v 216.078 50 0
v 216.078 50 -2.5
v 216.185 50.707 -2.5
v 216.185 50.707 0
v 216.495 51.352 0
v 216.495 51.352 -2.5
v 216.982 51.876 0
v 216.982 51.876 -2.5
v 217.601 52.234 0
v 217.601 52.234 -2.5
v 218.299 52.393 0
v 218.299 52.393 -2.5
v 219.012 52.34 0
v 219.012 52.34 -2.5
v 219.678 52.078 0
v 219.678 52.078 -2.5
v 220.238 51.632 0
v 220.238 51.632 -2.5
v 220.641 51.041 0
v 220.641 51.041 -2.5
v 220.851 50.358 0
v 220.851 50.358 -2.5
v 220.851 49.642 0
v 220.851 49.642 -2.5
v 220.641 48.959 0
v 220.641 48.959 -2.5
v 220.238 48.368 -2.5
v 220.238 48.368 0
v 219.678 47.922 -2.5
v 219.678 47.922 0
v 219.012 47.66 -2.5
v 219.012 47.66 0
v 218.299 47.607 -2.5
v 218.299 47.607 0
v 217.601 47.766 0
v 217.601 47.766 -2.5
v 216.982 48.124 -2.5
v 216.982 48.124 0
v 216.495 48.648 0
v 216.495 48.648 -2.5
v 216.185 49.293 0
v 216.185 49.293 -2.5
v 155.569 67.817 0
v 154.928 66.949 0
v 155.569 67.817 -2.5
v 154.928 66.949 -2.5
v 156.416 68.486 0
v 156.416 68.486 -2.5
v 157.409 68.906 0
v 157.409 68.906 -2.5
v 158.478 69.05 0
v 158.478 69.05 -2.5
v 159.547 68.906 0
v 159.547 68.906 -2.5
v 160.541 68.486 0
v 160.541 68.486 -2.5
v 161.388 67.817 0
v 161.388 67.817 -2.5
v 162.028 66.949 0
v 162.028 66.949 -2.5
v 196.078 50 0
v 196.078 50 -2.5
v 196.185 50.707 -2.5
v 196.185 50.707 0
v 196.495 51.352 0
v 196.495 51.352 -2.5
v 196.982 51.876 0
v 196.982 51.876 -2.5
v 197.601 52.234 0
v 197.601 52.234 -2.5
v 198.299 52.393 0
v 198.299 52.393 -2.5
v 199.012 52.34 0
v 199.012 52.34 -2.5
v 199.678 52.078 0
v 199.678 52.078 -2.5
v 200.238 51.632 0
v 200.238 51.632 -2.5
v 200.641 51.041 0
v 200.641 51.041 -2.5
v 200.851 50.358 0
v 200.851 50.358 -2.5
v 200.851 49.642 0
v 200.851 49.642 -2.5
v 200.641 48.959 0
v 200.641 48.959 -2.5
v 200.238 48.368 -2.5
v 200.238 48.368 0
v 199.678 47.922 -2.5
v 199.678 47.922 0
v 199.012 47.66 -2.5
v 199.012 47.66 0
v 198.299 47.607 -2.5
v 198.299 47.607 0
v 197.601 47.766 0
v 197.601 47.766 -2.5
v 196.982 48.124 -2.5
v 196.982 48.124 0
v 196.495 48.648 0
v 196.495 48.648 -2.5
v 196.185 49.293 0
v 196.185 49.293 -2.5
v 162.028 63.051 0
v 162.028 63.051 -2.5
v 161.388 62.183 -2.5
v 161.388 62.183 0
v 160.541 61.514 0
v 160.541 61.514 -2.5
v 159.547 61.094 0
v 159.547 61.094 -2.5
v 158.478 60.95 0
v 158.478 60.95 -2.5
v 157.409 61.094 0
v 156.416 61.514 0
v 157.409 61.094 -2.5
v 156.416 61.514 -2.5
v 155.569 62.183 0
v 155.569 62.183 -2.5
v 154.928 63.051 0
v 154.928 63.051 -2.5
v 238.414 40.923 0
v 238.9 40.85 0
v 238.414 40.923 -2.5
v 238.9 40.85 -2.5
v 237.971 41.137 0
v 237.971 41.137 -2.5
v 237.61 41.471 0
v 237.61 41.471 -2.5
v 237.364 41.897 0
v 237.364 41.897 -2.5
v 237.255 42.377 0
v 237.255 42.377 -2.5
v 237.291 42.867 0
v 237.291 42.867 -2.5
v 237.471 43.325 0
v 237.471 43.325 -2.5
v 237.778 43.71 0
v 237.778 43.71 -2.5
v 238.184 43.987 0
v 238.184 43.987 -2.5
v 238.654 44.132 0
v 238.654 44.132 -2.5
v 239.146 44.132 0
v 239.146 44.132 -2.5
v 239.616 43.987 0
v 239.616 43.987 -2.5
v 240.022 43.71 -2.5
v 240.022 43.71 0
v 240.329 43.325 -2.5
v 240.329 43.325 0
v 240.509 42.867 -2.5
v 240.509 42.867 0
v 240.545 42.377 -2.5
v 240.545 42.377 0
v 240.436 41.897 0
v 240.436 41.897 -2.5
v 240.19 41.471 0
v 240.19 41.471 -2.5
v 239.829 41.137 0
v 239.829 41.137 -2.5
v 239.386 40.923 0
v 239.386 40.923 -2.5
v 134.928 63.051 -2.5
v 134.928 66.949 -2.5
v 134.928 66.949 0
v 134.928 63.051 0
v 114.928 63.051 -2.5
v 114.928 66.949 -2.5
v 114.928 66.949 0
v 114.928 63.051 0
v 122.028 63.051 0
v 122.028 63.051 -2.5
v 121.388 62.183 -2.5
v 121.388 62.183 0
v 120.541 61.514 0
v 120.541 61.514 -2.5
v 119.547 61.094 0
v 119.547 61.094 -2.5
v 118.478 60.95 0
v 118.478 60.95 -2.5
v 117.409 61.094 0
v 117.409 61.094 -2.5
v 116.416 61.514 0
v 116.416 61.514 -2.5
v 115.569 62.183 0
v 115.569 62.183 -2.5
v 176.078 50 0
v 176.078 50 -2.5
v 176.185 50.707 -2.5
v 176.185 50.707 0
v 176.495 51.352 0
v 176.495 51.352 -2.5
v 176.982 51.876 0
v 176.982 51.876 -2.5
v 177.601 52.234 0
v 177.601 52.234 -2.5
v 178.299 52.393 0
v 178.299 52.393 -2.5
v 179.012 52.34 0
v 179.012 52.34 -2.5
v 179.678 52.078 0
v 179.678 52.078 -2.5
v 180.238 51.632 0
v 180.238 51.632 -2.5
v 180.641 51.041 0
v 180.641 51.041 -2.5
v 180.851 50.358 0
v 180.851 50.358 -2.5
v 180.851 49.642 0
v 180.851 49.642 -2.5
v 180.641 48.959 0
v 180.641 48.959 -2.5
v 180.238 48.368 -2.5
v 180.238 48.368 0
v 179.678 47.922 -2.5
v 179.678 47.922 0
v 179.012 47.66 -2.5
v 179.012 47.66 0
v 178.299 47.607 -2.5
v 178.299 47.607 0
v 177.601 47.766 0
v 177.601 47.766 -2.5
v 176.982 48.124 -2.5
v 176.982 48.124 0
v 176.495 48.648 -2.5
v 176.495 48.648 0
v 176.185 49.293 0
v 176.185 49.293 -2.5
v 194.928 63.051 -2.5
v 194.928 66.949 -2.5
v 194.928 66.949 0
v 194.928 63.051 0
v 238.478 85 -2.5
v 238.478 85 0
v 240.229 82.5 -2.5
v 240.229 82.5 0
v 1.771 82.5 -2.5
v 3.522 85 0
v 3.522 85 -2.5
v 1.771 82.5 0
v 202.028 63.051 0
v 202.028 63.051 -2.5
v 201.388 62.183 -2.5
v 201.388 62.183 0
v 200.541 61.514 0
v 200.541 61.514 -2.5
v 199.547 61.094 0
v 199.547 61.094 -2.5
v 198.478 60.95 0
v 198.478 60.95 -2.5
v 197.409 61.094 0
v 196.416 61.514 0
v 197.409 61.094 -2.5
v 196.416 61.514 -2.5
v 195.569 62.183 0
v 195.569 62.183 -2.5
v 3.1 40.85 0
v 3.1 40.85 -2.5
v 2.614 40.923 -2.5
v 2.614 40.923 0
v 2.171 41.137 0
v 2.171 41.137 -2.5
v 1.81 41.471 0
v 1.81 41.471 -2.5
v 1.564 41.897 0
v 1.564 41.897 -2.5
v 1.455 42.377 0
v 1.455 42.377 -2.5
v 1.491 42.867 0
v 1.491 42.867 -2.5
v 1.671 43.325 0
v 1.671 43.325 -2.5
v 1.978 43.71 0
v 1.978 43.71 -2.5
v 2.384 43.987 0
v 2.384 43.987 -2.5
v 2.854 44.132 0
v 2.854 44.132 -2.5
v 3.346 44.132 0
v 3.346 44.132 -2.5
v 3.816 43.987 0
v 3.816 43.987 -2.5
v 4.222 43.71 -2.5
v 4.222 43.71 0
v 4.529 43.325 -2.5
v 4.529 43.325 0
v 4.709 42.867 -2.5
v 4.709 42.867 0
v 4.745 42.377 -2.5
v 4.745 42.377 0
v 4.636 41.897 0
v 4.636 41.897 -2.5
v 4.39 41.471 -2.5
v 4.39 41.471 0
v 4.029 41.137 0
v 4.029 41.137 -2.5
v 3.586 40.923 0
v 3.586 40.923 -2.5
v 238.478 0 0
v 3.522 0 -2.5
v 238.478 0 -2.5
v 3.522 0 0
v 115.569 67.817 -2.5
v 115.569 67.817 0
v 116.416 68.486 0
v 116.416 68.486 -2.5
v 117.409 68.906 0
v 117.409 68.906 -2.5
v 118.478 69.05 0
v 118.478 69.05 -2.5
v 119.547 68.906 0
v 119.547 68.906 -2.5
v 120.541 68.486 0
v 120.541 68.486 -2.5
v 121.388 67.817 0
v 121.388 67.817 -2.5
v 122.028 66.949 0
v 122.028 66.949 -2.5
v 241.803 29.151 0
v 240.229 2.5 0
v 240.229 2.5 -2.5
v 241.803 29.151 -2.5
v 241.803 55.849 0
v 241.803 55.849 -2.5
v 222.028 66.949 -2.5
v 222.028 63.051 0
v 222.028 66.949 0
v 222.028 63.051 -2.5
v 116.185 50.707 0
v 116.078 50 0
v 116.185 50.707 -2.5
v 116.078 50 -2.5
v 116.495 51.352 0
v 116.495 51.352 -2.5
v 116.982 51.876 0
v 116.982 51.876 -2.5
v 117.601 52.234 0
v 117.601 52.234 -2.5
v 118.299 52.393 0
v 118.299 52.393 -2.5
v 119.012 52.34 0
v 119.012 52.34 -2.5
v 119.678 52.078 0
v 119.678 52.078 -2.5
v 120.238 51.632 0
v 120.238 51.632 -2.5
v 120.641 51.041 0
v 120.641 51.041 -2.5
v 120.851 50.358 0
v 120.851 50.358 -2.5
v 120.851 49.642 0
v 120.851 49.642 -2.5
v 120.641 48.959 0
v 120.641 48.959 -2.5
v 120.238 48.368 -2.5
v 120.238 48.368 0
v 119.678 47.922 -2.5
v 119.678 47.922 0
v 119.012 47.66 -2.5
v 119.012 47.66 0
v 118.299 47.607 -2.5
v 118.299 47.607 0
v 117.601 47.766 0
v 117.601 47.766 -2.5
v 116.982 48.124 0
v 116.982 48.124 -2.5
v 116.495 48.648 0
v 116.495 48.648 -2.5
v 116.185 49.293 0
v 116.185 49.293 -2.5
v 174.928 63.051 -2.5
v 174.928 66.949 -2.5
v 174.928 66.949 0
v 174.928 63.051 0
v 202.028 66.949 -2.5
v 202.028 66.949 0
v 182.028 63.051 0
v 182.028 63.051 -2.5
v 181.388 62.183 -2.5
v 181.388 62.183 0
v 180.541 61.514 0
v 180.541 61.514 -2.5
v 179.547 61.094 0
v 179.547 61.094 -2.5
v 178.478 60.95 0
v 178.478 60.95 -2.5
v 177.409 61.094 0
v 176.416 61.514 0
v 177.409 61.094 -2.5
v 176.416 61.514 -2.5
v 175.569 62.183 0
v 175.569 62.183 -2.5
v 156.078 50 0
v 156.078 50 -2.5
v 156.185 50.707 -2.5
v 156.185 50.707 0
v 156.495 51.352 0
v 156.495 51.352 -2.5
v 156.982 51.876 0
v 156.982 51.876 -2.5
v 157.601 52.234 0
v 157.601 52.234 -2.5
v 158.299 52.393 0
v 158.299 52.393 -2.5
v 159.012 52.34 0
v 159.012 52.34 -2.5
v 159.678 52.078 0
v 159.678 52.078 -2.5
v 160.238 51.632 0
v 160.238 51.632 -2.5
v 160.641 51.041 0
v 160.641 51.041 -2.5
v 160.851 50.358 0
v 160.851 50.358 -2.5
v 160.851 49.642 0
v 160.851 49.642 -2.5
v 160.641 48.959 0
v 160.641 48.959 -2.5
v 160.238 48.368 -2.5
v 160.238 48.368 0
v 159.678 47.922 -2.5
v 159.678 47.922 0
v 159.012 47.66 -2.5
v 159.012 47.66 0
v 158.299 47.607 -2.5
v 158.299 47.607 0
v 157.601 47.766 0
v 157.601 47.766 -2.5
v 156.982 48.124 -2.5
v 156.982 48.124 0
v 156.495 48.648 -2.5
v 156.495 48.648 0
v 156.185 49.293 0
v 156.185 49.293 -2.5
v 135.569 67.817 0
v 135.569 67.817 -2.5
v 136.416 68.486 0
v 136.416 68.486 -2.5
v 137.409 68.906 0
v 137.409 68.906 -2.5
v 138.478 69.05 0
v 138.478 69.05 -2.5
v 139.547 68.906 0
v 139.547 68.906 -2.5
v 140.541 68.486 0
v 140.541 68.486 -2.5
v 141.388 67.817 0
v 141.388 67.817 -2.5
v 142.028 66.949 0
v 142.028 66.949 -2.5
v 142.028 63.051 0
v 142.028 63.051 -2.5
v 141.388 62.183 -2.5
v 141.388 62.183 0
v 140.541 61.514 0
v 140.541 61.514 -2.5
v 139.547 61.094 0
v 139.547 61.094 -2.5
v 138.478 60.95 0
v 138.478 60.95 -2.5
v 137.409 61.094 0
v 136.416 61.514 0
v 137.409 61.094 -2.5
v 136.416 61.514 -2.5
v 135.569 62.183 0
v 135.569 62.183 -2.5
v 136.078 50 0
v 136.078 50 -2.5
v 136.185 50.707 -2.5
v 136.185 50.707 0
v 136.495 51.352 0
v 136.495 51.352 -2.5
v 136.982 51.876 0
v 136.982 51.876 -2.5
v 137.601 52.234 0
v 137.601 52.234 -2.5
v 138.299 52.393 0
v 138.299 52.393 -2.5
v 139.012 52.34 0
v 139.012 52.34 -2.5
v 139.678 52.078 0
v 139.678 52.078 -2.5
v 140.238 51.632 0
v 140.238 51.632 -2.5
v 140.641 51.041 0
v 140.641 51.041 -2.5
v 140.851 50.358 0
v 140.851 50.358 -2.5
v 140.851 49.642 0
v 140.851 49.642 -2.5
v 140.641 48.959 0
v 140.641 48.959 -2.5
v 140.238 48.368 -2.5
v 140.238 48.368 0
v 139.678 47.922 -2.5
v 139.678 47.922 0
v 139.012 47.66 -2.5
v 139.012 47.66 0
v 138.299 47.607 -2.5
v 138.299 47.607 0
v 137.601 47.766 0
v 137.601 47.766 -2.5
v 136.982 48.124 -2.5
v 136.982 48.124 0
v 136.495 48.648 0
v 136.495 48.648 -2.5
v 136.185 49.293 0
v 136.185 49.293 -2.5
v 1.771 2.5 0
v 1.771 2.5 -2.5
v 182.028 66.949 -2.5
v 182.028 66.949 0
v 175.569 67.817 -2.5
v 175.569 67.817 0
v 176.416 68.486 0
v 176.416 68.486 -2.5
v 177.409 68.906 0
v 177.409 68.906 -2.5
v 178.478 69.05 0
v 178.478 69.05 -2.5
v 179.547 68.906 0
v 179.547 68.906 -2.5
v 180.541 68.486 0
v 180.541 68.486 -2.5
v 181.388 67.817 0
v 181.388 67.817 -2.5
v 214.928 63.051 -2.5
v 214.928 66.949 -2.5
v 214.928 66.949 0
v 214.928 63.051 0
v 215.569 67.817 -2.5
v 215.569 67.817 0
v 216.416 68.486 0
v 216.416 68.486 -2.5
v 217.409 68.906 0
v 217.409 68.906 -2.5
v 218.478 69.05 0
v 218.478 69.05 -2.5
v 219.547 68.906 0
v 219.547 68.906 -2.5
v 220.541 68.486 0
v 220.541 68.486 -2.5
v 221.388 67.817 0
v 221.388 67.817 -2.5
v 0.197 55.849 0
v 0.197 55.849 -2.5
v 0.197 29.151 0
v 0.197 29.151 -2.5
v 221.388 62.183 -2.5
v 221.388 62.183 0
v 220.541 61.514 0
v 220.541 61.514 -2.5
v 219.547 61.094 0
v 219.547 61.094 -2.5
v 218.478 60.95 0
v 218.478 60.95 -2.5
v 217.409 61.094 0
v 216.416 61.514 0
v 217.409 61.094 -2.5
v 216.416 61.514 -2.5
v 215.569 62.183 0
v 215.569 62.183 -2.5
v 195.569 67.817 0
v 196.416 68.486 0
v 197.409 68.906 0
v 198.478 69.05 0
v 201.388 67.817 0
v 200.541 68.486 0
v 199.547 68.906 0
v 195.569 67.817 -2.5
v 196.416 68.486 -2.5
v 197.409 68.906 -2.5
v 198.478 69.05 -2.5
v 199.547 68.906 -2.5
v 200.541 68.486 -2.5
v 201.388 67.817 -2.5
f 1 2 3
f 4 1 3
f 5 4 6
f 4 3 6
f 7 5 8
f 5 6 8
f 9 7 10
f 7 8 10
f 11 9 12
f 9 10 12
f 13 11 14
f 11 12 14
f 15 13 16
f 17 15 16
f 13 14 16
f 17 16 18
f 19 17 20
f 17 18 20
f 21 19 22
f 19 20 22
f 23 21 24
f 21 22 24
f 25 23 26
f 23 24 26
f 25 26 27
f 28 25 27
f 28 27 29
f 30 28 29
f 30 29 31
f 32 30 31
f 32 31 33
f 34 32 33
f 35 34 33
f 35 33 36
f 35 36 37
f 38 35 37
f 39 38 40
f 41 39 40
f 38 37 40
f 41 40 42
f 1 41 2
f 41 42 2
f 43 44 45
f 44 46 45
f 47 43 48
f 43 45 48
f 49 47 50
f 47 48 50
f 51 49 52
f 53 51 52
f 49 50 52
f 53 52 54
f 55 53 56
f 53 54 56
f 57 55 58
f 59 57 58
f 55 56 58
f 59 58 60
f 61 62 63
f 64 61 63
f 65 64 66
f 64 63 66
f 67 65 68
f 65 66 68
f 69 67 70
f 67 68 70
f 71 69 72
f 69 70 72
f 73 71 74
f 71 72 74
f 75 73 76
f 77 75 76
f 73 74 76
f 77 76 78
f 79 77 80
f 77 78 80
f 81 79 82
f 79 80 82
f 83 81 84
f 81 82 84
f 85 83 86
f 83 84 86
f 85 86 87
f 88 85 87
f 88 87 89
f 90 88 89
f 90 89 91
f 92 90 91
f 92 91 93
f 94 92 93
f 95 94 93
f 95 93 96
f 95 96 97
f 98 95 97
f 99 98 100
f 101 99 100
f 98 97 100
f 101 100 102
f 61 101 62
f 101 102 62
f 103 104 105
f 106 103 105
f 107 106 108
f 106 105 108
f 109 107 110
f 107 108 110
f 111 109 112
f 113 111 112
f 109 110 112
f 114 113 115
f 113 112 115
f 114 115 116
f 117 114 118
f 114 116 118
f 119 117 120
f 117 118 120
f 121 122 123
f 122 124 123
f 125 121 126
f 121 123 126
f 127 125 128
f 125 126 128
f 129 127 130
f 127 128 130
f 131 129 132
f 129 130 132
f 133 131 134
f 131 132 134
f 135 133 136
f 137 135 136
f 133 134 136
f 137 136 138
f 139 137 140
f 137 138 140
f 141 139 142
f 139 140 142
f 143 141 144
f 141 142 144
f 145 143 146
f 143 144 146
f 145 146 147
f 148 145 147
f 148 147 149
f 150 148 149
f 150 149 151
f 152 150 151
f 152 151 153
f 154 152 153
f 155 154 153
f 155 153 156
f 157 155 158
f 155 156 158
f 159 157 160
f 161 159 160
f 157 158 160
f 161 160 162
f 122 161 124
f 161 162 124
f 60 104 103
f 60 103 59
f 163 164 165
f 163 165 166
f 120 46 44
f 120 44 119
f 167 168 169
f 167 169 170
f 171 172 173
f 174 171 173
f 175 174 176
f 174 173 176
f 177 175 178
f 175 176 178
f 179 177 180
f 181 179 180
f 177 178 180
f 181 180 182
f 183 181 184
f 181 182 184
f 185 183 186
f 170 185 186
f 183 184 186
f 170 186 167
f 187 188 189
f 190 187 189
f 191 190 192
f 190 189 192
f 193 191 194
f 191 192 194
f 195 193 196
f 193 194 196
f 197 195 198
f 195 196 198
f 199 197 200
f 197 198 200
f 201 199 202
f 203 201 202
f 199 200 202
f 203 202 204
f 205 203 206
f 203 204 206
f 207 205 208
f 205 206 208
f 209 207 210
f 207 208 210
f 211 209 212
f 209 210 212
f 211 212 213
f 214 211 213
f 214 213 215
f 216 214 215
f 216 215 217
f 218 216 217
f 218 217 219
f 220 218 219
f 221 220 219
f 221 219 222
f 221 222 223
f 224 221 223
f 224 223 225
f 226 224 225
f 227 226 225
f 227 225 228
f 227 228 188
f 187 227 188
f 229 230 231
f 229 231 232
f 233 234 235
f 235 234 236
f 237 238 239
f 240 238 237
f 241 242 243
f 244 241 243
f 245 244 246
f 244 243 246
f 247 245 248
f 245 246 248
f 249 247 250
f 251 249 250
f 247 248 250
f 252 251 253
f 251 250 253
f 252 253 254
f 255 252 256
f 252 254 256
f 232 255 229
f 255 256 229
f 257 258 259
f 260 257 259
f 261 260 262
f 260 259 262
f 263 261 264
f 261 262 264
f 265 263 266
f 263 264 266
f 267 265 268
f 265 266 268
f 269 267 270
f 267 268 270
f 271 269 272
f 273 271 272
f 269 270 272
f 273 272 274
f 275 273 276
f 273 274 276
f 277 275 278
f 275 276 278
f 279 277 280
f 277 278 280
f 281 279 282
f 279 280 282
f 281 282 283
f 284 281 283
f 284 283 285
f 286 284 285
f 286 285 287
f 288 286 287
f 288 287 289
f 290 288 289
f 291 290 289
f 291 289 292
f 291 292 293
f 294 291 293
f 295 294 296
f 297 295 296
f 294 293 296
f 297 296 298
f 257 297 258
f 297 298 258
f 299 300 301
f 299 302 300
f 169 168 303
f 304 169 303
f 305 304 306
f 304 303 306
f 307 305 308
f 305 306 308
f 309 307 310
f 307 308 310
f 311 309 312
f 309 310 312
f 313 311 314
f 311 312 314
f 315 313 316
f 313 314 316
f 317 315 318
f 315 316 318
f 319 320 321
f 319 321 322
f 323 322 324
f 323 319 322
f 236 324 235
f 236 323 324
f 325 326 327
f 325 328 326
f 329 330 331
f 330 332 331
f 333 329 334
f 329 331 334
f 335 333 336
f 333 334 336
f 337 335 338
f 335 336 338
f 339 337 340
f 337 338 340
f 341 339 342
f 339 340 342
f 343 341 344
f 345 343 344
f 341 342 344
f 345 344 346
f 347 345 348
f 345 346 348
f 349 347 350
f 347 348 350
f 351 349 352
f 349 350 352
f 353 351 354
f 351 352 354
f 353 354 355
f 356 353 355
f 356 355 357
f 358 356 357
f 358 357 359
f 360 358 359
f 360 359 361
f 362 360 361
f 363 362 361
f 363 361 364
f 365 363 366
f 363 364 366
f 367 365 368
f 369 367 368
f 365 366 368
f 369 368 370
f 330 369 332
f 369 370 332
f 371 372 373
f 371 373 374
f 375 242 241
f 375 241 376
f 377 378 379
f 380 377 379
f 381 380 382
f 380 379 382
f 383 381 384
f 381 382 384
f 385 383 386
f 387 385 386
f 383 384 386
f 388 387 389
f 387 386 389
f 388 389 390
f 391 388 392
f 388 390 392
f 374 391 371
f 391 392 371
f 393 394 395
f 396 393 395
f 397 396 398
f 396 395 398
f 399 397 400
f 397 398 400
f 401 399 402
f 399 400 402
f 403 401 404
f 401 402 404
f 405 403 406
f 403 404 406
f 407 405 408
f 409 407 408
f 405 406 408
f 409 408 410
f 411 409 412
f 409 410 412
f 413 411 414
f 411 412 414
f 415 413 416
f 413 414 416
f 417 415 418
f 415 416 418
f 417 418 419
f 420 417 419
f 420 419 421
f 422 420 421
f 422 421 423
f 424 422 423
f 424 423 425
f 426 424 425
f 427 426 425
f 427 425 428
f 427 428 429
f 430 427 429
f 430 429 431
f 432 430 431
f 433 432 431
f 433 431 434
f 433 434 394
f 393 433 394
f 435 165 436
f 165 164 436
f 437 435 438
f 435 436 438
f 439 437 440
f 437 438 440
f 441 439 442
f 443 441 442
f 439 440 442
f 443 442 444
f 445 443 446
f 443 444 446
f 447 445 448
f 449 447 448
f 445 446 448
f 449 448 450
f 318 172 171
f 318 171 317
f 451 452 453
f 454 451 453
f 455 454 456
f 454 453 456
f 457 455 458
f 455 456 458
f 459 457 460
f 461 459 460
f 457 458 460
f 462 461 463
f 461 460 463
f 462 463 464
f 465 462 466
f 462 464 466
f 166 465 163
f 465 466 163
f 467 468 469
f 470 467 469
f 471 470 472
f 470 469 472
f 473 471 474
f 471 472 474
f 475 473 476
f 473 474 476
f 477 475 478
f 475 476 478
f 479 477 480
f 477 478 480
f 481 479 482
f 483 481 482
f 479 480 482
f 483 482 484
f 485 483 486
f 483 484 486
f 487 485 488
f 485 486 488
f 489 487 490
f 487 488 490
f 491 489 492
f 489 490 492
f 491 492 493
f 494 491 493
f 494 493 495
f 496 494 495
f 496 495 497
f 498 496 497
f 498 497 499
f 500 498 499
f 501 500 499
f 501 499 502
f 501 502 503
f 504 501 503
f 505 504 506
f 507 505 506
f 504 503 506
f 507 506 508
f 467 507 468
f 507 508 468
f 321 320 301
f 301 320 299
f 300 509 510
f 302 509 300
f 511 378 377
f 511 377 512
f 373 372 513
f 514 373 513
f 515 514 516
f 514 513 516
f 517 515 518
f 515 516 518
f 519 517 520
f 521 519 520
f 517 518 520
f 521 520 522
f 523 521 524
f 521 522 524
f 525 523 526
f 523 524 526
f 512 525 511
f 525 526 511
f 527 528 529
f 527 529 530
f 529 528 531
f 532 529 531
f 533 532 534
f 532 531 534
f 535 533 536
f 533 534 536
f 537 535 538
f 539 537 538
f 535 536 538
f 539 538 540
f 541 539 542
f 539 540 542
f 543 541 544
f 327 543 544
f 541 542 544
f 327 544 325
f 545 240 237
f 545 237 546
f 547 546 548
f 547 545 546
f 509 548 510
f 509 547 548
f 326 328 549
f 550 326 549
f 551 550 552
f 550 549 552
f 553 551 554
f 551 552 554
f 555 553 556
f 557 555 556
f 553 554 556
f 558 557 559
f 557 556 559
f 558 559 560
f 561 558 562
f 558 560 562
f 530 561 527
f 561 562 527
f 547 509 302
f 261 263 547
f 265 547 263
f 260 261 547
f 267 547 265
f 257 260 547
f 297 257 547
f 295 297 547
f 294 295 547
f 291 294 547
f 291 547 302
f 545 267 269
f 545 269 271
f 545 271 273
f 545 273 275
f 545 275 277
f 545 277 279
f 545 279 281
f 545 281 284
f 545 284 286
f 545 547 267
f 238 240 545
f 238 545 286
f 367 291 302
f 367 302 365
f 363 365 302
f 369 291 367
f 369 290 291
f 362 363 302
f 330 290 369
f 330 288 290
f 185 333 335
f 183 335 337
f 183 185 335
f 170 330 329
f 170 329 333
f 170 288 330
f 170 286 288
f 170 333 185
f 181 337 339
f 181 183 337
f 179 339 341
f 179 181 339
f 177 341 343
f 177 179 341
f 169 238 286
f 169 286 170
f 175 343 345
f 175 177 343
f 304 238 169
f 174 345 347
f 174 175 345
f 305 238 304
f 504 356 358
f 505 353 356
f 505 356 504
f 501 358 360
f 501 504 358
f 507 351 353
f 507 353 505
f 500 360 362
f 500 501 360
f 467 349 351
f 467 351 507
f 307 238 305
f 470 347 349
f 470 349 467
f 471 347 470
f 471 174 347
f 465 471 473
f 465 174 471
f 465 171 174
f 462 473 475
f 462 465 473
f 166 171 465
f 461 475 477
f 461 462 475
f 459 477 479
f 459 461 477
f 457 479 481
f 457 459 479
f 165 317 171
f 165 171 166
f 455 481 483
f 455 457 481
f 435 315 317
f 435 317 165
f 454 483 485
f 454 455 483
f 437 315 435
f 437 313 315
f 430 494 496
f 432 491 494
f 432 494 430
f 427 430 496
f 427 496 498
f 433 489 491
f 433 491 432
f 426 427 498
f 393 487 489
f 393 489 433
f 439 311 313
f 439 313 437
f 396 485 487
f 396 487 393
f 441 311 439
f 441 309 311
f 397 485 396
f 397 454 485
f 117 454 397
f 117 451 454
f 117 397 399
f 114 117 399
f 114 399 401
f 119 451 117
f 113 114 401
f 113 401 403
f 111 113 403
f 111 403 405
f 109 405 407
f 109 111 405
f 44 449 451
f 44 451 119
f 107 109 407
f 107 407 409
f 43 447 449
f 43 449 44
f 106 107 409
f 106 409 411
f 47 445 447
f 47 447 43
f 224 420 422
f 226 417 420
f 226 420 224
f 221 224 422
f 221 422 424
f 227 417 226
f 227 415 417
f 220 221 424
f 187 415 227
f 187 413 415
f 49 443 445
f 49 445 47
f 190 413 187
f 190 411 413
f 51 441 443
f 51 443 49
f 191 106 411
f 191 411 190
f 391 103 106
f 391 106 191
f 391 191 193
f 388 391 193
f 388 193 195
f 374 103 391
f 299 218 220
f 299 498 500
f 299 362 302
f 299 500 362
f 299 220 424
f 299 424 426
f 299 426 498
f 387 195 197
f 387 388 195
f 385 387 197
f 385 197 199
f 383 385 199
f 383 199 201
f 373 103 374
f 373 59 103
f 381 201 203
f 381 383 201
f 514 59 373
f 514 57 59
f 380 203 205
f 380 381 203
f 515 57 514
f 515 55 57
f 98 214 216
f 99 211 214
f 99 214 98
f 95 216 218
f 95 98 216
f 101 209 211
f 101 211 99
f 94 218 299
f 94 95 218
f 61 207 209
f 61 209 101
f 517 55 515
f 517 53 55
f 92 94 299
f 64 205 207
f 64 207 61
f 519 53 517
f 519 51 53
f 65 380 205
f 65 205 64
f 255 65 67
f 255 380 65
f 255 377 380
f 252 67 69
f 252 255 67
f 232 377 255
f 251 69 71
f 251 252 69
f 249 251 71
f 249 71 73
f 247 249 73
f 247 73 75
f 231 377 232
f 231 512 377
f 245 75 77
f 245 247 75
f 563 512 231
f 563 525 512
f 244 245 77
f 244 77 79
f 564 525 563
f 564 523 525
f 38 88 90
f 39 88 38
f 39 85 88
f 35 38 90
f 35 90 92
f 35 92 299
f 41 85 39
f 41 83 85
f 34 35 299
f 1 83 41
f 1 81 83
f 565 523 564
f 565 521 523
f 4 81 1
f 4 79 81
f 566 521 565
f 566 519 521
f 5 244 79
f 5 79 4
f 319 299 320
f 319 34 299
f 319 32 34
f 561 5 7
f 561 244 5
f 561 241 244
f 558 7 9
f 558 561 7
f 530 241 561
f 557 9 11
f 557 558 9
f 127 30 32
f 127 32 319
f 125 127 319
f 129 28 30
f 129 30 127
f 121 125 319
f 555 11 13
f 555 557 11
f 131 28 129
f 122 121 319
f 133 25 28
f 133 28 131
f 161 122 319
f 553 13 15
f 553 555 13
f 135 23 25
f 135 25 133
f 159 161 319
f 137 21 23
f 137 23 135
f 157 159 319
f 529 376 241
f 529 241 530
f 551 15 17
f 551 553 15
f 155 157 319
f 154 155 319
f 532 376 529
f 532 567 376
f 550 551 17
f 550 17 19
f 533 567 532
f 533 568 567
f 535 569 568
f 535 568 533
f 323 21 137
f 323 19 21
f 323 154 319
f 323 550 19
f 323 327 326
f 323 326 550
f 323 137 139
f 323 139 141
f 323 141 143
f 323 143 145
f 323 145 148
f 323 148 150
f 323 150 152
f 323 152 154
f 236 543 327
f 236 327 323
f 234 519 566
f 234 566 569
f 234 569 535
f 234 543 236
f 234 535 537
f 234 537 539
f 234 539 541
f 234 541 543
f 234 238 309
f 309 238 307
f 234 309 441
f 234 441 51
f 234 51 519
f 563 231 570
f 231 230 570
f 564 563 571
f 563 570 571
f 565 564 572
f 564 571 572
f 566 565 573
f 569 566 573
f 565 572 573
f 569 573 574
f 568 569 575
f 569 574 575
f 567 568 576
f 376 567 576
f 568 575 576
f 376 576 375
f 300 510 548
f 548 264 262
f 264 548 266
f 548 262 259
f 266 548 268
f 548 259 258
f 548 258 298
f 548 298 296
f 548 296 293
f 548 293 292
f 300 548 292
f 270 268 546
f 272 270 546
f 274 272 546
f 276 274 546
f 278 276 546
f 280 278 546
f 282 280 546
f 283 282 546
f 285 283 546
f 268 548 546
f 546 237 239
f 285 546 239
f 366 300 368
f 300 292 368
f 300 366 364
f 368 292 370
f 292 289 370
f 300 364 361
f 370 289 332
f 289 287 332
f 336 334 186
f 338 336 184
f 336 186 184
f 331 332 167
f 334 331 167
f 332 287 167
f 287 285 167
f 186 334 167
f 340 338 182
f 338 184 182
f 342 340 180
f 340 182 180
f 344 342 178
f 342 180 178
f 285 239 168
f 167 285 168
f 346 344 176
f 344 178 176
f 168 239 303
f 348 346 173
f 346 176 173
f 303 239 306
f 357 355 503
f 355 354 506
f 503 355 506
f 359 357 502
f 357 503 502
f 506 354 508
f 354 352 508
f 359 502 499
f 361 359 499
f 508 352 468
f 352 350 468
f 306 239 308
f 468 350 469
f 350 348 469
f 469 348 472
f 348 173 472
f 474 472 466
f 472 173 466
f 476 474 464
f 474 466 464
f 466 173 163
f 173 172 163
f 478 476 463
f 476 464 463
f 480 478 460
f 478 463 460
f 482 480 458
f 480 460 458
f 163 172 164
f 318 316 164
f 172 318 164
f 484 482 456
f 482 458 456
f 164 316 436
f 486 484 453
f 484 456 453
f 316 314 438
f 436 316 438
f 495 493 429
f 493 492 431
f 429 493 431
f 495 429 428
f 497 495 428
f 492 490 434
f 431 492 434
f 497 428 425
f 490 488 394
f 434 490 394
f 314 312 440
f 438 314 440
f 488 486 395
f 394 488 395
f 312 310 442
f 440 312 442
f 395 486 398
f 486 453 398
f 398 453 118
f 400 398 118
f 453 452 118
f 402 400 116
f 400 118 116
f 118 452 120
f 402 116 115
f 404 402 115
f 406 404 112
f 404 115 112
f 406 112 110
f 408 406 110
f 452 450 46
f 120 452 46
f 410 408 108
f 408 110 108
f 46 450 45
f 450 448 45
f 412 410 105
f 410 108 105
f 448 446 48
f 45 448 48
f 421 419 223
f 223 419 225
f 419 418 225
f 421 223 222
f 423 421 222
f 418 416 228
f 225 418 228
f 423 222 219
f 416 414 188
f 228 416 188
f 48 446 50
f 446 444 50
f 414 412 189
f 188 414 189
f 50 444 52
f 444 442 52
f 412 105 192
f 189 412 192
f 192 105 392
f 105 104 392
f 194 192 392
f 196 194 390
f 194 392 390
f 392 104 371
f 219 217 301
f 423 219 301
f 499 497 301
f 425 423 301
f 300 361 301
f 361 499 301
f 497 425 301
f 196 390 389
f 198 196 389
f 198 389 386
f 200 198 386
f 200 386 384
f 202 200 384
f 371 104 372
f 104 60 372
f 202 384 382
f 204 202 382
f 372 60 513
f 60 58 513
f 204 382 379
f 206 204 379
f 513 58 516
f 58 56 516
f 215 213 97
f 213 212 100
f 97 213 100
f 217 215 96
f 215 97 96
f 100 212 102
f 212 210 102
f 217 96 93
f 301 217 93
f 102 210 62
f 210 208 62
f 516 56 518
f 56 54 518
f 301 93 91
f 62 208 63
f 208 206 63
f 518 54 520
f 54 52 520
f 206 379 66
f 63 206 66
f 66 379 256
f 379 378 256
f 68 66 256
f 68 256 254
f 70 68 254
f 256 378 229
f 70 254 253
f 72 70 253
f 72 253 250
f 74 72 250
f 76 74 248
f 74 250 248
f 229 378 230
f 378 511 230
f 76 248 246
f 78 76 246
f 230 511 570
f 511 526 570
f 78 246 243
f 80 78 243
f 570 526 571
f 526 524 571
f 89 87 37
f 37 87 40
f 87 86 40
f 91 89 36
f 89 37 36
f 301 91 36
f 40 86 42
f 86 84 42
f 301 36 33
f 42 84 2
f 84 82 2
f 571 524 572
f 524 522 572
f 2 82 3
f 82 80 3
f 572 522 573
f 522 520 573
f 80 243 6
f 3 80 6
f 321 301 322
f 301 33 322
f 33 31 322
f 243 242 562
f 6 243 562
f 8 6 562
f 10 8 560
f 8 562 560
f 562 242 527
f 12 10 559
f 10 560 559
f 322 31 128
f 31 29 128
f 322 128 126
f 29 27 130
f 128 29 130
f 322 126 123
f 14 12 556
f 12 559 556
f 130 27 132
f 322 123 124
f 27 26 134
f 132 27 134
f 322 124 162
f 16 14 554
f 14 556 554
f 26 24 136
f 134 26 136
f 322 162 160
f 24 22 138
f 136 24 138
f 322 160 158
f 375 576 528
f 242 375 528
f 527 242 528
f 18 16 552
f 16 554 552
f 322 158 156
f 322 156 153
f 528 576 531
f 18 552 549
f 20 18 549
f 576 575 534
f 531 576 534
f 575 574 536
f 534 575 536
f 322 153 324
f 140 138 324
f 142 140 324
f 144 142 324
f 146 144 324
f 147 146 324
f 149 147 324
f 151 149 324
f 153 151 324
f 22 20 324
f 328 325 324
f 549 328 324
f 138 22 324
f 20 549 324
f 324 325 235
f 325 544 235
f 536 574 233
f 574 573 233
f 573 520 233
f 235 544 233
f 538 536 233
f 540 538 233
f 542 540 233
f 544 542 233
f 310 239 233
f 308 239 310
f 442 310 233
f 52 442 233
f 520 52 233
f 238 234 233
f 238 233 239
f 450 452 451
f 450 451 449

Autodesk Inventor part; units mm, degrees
ref_plane "YZ Plane" through (0, 0, 0) normal (1, 0, 0) x (0, 1, 0)
ref_plane "XZ Plane" through (0, 0, 0) normal (0, 1, 0) x (-1, 0, 0)
ref_plane "XY Plane" through (0, 0, 0) normal (0, 0, 1) x (1, 0, 0)
sketch "Skizze1" plane through (0, 0, 0) normal (0, 0, 1) x (1, 0, 0)
  line L0 (0, 0) -> (242, 0)
  line L1 (242, 0) -> (242, 85)
  line L2 (242, 85) -> (0, 85)
  line L3 (0, 85) -> (0, 0)
  line L4 (242, 42.5) -> (842, 42.5)
  line L5 (0, 42.5) -> (-937, 42.5)
  arc A0 (240, 0) -> (240, 85) centre (-210.5625, 42.5) ccw
  arc A1 (2, 85) -> (2, 0) centre (452.5625, 42.5) ccw
  dimension "d0" = 85
  dimension "d1" = 242
  dimension "d2" = 2
  dimension "d3" = 2
  dimension "d4" = 2
  dimension "d7" = 452.5625
  dimension "d8" = 452.5625
extrude "Extrusion1" add sketch "Skizze1" against normal blind 2.5 contours A1 L2 A0 L0
sketch "Skizze2" plane through (0, 0, 0) normal (0, 0, 1) x (1, 0, 0)
  line L0 (2, 0) -> (240, 0) projected
  line L1 (240, 85) -> (2, 85) projected
  line L2 (121, 0) -> (121, 85)
  point P0 (0, 0)
  point P1 (3.1, 42.5)
  point P2 (238.9, 42.5)
  dimension "d11" = 42.5
  dimension "d12" = 42.5
  dimension "d13" = 235.8
  dimension "d14" = 117.9
  dimension "d15" = 117.9
hole "Bohrung1" at (3.1, 42.5, 0) at (238.9, 42.5, 0) direction (0, 0, -1) diameter 3.3 depth 8 tip angle 118
sketch "Skizze3" plane through (0, 0, 0) normal (0, 0, 1) x (1, 0, 0)
  line L0 (2, 0) -> (240, 0) projected
  line L1 (240, 85) -> (2, 85) projected
  arc A0 (2, 85) -> (2, 0) centre (452.5625, 42.5) ccw projected
  line L2 (8.1386, 91.5936) -> (-1.2688, 78.1585)
  line L3 (-1.2688, 78.1585) -> (-1.2688, 91.5936)
  line L4 (-1.2688, 91.5936) -> (8.1386, 91.5936)
  line L5 (-1.7926, 7.5896) -> (9.0296, -7.8661)
  line L6 (9.0296, -7.8661) -> (-1.7926, -7.8661)
  line L7 (-1.7926, -7.8661) -> (-1.7926, 7.5896)
  line L8 (121, 0) -> (121, 85)
  line L9 (233.8614, 91.5936) -> (243.2688, 78.1585)
  line L10 (243.2688, 78.1585) -> (243.2688, 91.5936)
  line L11 (243.2688, 91.5936) -> (233.8614, 91.5936)
  line L12 (243.7926, 7.5896) -> (232.9704, -7.8661)
  line L13 (232.9704, -7.8661) -> (243.7926, -7.8661)
  line L14 (243.7926, -7.8661) -> (243.7926, 7.5896)
  point P0 (0, 0)
  point P1 (1.7712, 82.5)
  point P2 (1.7712, 2.5)
  point P3 (242, 0)
  point P4 (240.2288, 82.5)
  point P5 (240.2288, 2.5)
  dimension "d23" = 55
  dimension "d24" = 55
  dimension "d25" = 2.5
  dimension "d26" = 2.5
extrude "Extrusion2" cut sketch "Skizze3" against normal blind 5 contours A0 L5 L0 | L0 L5 L6 L7 A0 | L9 L11 L10 | L12 L14 L13 | L2 L3 L4 L1 A0 | A0 L1 L2
sketch "Sketch7" plane through (0, 0, 0) normal (0, 0, 1) x (1, 0, 0)
  point P0 (0, 0)
sketch "Sketch9" plane through (0, 0, -2.5) normal (0, 0, -1) x (-1, 0, 0)
  line L0 (-238.4783, 85) -> (-3.5217, 85) projected
  line L1 (-214.9283, 63.0506) -> (-222.0283, 63.0506) construction
  line L2 (-222.0283, 63.0506) -> (-222.0283, 66.9494)
  line L3 (-222.0283, 66.9494) -> (-214.9283, 66.9494) construction
  line L4 (-214.9283, 66.9494) -> (-214.9283, 63.0506)
  line L5 (-214.9283, 63.0506) -> (-222.0283, 66.9494) construction
  line L6 (-222.0283, 63.0506) -> (-214.9283, 66.9494) construction
  arc A0 (-222.0283, 63.0506) -> (-214.9283, 63.0506) centre (-218.4783, 65) ccw
  arc A1 (-214.9283, 66.9494) -> (-222.0283, 66.9494) centre (-218.4783, 65) ccw
  line L7 (-194.9283, 63.0506) -> (-202.0283, 63.0506) construction
  line L8 (-202.0283, 63.0506) -> (-202.0283, 66.9494)
  line L9 (-202.0283, 66.9494) -> (-194.9283, 66.9494) construction
  line L10 (-194.9283, 66.9494) -> (-194.9283, 63.0506)
  line L11 (-194.9283, 63.0506) -> (-202.0283, 66.9494) construction
  line L12 (-202.0283, 63.0506) -> (-194.9283, 66.9494) construction
  arc A2 (-202.0283, 63.0506) -> (-194.9283, 63.0506) centre (-198.4783, 65) ccw
  arc A3 (-194.9283, 66.9494) -> (-202.0283, 66.9494) centre (-198.4783, 65) ccw
  line L13 (-174.9283, 63.0506) -> (-182.0283, 63.0506) construction
  line L14 (-182.0283, 63.0506) -> (-182.0283, 66.9494)
  line L15 (-182.0283, 66.9494) -> (-174.9283, 66.9494) construction
  line L16 (-174.9283, 66.9494) -> (-174.9283, 63.0506)
  line L17 (-174.9283, 63.0506) -> (-182.0283, 66.9494) construction
  line L18 (-182.0283, 63.0506) -> (-174.9283, 66.9494) construction
  arc A4 (-182.0283, 63.0506) -> (-174.9283, 63.0506) centre (-178.4783, 65) ccw
  arc A5 (-174.9283, 66.9494) -> (-182.0283, 66.9494) centre (-178.4783, 65) ccw
  line L19 (-154.9283, 63.0506) -> (-162.0283, 63.0506) construction
  line L20 (-162.0283, 63.0506) -> (-162.0283, 66.9494)
  line L21 (-162.0283, 66.9494) -> (-154.9283, 66.9494) construction
  line L22 (-154.9283, 66.9494) -> (-154.9283, 63.0506)
  line L23 (-154.9283, 63.0506) -> (-162.0283, 66.9494) construction
  line L24 (-162.0283, 63.0506) -> (-154.9283, 66.9494) construction
  arc A6 (-162.0283, 63.0506) -> (-154.9283, 63.0506) centre (-158.4783, 65) ccw
  arc A7 (-154.9283, 66.9494) -> (-162.0283, 66.9494) centre (-158.4783, 65) ccw
  line L25 (-134.9283, 63.0506) -> (-142.0283, 63.0506) construction
  line L26 (-142.0283, 63.0506) -> (-142.0283, 66.9494)
  line L27 (-142.0283, 66.9494) -> (-134.9283, 66.9494) construction
  line L28 (-134.9283, 66.9494) -> (-134.9283, 63.0506)
  line L29 (-134.9283, 63.0506) -> (-142.0283, 66.9494) construction
  line L30 (-142.0283, 63.0506) -> (-134.9283, 66.9494) construction
  arc A8 (-142.0283, 63.0506) -> (-134.9283, 63.0506) centre (-138.4783, 65) ccw
  arc A9 (-134.9283, 66.9494) -> (-142.0283, 66.9494) centre (-138.4783, 65) ccw
  line L31 (-114.9283, 63.0506) -> (-122.0283, 63.0506) construction
  line L32 (-122.0283, 63.0506) -> (-122.0283, 66.9494)
  line L33 (-122.0283, 66.9494) -> (-114.9283, 66.9494) construction
  line L34 (-114.9283, 66.9494) -> (-114.9283, 63.0506)
  line L35 (-114.9283, 63.0506) -> (-122.0283, 66.9494) construction
  line L36 (-122.0283, 63.0506) -> (-114.9283, 66.9494) construction
  arc A10 (-122.0283, 63.0506) -> (-114.9283, 63.0506) centre (-118.4783, 65) ccw
  arc A11 (-114.9283, 66.9494) -> (-122.0283, 66.9494) centre (-118.4783, 65) ccw
  circle A12 centre (-218.4783, 50) radius 2.4
  circle A13 centre (-198.4783, 50) radius 2.4
  circle A14 centre (-178.4783, 50) radius 2.4
  circle A15 centre (-158.4783, 50) radius 2.4
  circle A16 centre (-138.4783, 50) radius 2.4
  circle A17 centre (-118.4783, 50) radius 2.4
  point P0 (0, 0)
  dimension "d97" = 20
  dimension "d98" = 20
  dimension "d99" = 7.1
  dimension "d100" = 4.05
  dimension "d103" = 20
  dimension "d108" = 15
  dimension "d109" = 4.8
  dimension "d112" = 20
extrude "Extrusion6" cut sketch "Sketch9" against normal blind 3
properties part number "Frontplatte Apra Xdream 418"
